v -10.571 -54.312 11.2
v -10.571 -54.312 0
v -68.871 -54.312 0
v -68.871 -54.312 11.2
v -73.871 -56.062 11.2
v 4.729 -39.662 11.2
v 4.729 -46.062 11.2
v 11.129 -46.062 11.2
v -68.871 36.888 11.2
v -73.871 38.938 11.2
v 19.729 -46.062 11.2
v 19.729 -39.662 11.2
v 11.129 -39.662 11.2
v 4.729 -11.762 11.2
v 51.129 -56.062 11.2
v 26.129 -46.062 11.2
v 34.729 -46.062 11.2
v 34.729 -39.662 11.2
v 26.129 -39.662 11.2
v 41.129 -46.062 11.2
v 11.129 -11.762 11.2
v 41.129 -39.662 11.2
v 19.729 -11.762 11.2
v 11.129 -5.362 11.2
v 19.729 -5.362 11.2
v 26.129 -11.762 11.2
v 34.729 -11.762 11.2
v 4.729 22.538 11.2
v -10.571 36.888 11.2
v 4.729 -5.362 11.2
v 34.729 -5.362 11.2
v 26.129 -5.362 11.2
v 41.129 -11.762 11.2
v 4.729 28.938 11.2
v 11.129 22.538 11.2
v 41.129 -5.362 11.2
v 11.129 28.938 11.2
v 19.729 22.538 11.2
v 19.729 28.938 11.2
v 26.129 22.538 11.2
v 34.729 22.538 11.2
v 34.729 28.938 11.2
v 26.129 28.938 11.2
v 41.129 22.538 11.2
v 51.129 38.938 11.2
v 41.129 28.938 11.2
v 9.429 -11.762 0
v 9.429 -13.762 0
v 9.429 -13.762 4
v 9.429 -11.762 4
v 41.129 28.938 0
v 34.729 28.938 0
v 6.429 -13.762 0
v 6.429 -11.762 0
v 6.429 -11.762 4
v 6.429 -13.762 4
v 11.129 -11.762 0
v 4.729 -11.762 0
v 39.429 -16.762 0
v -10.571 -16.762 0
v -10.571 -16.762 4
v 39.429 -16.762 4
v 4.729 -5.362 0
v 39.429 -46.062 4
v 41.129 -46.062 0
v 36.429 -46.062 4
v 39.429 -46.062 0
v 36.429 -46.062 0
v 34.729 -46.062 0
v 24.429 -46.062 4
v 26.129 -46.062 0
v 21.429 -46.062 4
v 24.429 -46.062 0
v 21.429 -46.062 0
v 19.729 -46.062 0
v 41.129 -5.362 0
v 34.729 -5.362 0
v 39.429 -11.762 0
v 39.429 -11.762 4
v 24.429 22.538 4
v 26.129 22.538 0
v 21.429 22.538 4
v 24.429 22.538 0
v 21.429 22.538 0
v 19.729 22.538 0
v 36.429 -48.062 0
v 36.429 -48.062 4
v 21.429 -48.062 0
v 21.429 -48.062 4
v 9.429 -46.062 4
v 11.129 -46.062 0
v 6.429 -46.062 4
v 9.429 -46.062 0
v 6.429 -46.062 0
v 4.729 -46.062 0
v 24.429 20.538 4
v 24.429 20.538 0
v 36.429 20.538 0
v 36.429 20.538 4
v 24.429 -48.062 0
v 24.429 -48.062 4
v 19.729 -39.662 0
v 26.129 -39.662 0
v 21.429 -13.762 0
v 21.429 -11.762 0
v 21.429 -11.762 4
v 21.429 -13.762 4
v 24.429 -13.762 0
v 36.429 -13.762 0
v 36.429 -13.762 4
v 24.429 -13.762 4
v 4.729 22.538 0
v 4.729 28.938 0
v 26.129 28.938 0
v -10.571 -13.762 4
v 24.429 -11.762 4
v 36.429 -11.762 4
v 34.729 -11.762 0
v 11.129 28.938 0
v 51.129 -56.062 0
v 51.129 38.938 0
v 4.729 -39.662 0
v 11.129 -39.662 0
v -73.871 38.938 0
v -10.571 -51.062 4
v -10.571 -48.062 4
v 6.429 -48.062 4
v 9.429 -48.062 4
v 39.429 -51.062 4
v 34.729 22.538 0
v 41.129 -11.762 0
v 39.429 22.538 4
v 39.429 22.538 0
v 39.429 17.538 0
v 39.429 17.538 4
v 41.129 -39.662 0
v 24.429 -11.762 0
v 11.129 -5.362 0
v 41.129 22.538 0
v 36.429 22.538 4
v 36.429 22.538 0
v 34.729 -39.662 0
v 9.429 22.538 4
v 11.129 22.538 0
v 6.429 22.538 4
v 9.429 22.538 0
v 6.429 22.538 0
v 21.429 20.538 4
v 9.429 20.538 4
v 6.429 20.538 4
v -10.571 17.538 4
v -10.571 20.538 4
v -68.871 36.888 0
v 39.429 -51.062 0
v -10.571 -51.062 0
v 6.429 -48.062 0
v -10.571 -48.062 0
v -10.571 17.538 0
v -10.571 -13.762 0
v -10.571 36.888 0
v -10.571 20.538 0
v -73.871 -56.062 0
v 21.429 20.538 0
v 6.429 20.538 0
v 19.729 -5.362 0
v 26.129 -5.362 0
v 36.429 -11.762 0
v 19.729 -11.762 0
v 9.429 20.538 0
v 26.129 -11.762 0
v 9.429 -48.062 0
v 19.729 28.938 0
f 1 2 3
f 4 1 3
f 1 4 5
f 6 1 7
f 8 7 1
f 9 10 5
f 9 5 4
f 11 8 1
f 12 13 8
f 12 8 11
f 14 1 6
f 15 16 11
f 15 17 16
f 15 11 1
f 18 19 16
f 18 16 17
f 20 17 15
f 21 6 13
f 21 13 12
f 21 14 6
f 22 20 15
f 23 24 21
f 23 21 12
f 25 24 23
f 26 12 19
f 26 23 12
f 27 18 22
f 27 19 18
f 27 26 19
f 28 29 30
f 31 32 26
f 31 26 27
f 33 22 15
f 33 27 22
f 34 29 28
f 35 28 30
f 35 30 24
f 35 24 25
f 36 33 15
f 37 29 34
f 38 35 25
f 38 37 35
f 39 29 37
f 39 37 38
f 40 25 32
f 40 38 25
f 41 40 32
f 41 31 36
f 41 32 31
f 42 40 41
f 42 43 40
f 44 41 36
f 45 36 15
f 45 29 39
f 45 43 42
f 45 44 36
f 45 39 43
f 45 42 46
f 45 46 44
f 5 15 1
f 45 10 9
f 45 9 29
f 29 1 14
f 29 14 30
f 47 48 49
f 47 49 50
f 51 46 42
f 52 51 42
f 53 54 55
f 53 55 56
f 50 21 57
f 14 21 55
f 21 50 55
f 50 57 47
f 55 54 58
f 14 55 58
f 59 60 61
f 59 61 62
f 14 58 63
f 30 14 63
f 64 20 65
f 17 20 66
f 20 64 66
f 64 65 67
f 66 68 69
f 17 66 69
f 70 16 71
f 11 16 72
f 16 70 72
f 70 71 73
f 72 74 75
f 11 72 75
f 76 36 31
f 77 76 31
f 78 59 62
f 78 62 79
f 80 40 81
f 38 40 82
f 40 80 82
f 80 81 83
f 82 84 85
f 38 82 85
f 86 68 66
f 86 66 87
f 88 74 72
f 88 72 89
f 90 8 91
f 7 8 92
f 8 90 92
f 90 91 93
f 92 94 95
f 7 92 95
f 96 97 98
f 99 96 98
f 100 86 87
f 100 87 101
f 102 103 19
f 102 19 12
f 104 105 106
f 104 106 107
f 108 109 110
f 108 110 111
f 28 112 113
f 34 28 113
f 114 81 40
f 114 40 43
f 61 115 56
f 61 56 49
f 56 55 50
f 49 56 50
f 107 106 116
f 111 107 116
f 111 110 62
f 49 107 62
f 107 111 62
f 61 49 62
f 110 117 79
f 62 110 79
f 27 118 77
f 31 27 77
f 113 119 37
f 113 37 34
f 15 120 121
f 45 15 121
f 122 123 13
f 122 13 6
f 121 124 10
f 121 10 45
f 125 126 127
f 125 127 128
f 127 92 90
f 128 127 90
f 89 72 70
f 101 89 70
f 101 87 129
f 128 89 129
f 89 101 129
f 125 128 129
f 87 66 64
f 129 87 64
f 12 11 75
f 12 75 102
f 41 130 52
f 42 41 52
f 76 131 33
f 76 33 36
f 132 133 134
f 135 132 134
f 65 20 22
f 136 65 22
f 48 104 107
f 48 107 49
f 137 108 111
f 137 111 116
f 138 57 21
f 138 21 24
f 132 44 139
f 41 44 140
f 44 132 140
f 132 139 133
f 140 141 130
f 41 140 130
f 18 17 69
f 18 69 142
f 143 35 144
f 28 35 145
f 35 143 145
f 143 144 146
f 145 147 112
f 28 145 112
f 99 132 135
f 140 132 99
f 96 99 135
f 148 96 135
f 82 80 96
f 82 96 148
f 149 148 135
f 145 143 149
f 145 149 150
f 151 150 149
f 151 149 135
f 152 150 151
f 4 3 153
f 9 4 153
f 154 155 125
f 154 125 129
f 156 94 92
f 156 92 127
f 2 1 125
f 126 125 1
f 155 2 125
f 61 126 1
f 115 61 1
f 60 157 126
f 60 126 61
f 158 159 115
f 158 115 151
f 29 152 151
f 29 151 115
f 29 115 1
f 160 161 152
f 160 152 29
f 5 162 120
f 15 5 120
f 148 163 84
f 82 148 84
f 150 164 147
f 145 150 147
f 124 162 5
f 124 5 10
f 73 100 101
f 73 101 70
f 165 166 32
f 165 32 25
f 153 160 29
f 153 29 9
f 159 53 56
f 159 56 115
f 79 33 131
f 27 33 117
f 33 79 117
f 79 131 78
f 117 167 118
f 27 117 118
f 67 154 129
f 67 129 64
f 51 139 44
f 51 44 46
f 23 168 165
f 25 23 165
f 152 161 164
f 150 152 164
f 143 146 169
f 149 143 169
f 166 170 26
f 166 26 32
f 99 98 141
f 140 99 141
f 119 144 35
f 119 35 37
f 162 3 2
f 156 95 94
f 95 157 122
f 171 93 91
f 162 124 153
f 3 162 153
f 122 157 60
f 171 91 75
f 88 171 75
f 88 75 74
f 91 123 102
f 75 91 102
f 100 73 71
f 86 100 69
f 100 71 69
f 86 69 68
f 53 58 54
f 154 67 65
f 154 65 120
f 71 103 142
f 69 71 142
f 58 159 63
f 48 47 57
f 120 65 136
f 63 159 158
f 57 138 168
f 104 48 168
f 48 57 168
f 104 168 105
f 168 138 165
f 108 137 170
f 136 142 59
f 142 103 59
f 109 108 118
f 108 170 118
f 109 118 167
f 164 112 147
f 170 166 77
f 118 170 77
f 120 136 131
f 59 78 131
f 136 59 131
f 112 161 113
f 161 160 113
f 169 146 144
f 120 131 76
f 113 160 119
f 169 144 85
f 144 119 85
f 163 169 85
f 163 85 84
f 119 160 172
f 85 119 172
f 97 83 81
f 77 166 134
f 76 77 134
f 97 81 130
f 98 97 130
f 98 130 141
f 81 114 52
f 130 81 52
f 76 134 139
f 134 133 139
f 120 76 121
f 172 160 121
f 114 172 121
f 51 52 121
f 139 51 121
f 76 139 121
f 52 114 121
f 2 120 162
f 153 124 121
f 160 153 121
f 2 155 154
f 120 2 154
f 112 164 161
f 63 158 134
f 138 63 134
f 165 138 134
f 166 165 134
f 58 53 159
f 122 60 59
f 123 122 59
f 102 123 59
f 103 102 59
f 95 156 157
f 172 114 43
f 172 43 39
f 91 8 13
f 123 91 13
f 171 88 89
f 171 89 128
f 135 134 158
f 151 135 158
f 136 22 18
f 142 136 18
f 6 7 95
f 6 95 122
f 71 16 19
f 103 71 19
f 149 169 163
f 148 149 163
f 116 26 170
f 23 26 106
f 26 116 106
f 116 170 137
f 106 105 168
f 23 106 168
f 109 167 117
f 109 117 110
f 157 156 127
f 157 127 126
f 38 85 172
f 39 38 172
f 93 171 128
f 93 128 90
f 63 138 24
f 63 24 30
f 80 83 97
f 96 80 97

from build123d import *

# Parameters (mm, degrees)
CROQUIS1_W              = 125
CROQUIS1_H              = 95
SALIENTE_EXTRUIR1_DEPTH = 11.2
CROQUIS2_W              = 58.3
CROQUIS2_H              = 91.2
CROQUIS2_W_2            = 6.4
CROQUIS2_H_2            = 6.4
CORTAR_EXTRUIR1_DEPTH   = 32.5
CORTAR_EXTRUIR2_DEPTH   = 4


with BuildPart() as part:
    # Croquis1 → Saliente-Extruir1 (new body)
    with BuildSketch(Plane.XY):
        with Locations((-11.370773818, -8.561811531)):
            Rectangle(CROQUIS1_W, CROQUIS1_H)
    extrude(amount=SALIENTE_EXTRUIR1_DEPTH)

    # Croquis2 → Cortar-Extruir1 (cut)
    with BuildSketch(Plane(origin=(0, 0, 0), x_dir=(-1, 0, 0), z_dir=(0, 0, -1))):
        with Locations((39.720773818, -8.711811531)):
            Rectangle(CROQUIS2_W, CROQUIS2_H)
        with Locations((-37.929226182, 25.738188469)):
            Rectangle(CROQUIS2_W_2, CROQUIS2_H_2)
        with Locations((-22.929226182, 25.738188469)):
            Rectangle(CROQUIS2_W_2, CROQUIS2_H_2)
        with Locations((-7.929226182, 25.738188469)):
            Rectangle(CROQUIS2_W_2, CROQUIS2_H_2)
        with Locations((-22.929226182, -8.561811531)):
            Rectangle(CROQUIS2_W_2, CROQUIS2_H_2)
        with Locations((-7.929226182, -8.561811531)):
            Rectangle(CROQUIS2_W_2, CROQUIS2_H_2)
        with Locations((-22.929226182, -42.861811531)):
            Rectangle(CROQUIS2_W_2, CROQUIS2_H_2)
        with Locations((-7.929226182, -42.861811531)):
            Rectangle(CROQUIS2_W_2, CROQUIS2_H_2)
        with Locations((-37.929226182, -8.561811531)):
            Rectangle(CROQUIS2_W_2, CROQUIS2_H_2)
        with Locations((-37.929226182, -42.861811531)):
            Rectangle(CROQUIS2_W_2, CROQUIS2_H_2)
    extrude(amount=-CORTAR_EXTRUIR1_DEPTH, mode=Mode.SUBTRACT)

    # Croquis3 → Cortar-Extruir2 (cut)
    with BuildSketch(Plane(origin=(0, 0, 0), x_dir=(-1, 0, 0), z_dir=(0, 0, -1))):
        Polygon((-39.429226182, 22.538188469), (-39.429226182, 17.538188469), (10.570773818, 17.538188469), (10.570773818, 20.538188469), (-6.429226182, 20.538188469), (-6.429226182, 22.538188469), (-9.429226182, 22.538188469), (-9.429226182, 20.538188469), (-21.429226182, 20.538188469), (-21.429226182, 22.538188469), (-24.429226182, 22.538188469), (-24.429226182, 20.538188469), (-36.429226182, 20.538188469), (-36.429226182, 22.538188469), align=None)
        Polygon((-9.429226182, -11.761811531), (-6.429226182, -11.761811531), (-6.429226182, -13.761811531), (10.570773818, -13.761811531), (10.570773818, -16.761811531), (-39.429226182, -16.761811531), (-39.429226182, -11.761811531), (-36.429226182, -11.761811531), (-36.429226182, -13.761811531), (-24.429226182, -13.761811531), (-24.429226182, -11.761811531), (-21.429226182, -11.761811531), (-21.429226182, -13.761811531), (-9.429226182, -13.761811531), align=None)
        Polygon((-9.429226182, -46.061811531), (-6.429226182, -46.061811531), (-6.429226182, -48.061811531), (10.570773818, -48.061811531), (10.570773818, -51.061811531), (-39.429226182, -51.061811531), (-39.429226182, -46.061811531), (-36.429226182, -46.061811531), (-36.429226182, -48.061811531), (-24.429226182, -48.061811531), (-24.429226182, -46.061811531), (-21.429226182, -46.061811531), (-21.429226182, -48.061811531), (-9.429226182, -48.061811531), align=None)
    extrude(amount=-CORTAR_EXTRUIR2_DEPTH, mode=Mode.SUBTRACT)


solid = part.part
